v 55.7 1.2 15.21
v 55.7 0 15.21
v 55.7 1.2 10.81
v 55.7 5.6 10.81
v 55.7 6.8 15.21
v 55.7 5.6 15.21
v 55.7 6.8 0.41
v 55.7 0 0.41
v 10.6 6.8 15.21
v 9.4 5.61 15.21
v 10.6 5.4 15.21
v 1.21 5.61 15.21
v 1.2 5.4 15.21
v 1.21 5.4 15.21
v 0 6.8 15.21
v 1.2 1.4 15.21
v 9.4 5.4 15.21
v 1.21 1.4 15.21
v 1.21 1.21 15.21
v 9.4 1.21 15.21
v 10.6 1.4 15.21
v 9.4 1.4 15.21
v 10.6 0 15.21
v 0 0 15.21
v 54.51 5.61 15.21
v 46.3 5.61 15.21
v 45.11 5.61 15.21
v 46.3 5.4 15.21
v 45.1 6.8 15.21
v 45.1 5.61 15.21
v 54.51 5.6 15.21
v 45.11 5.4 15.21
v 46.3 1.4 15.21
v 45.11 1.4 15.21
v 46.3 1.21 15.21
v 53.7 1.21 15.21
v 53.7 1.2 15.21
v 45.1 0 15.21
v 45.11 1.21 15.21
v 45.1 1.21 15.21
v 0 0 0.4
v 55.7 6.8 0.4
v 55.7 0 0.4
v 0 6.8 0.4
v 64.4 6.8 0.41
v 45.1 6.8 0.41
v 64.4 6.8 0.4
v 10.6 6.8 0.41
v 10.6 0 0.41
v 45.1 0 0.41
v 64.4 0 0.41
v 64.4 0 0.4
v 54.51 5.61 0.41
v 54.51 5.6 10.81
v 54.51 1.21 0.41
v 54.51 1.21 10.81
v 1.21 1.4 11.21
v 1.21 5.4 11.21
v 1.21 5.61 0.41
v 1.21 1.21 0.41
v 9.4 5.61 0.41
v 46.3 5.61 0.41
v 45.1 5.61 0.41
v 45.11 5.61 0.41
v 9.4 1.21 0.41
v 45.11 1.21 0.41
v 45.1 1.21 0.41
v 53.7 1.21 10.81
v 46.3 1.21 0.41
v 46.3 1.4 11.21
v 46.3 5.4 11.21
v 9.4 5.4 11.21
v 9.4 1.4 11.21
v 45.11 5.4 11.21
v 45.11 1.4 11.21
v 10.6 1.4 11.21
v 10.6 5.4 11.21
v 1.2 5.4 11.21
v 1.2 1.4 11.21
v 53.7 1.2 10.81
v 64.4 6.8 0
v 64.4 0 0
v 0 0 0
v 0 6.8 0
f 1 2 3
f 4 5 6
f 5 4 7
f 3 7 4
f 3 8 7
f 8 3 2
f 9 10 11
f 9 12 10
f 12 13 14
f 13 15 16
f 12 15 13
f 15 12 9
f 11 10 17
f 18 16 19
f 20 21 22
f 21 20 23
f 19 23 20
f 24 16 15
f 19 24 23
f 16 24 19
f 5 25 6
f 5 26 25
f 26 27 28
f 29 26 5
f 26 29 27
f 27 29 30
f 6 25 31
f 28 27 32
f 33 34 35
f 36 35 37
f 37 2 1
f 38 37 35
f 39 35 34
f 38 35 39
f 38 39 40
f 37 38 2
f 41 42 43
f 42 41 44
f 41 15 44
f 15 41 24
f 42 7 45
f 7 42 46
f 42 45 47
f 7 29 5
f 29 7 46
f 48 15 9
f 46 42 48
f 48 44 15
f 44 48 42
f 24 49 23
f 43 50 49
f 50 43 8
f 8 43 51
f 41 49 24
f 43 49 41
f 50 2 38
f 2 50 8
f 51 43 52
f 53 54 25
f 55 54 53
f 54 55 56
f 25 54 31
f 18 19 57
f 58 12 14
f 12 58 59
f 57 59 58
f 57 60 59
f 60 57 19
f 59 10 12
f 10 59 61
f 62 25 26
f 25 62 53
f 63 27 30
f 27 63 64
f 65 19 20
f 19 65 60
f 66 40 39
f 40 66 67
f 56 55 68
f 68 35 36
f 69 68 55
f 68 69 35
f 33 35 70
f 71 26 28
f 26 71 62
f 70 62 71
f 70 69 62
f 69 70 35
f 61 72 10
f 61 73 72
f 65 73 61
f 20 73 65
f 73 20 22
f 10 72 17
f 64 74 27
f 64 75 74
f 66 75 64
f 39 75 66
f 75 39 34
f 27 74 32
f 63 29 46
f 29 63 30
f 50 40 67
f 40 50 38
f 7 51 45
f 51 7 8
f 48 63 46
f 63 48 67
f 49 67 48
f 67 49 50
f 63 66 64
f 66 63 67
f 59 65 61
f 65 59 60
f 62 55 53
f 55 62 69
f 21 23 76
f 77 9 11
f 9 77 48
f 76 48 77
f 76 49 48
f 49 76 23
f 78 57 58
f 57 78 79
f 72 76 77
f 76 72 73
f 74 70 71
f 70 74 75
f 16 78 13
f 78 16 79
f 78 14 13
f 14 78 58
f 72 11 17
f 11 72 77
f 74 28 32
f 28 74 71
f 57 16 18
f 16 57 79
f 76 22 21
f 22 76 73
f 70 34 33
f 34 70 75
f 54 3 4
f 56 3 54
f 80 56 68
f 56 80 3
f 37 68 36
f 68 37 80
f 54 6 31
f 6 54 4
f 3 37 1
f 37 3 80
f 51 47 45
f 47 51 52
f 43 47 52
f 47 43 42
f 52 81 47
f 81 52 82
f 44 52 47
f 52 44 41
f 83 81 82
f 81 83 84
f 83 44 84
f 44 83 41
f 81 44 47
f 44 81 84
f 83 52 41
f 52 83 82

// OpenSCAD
// file: ../../Base/Rotation.scad
// Fischertechnik Box Foundation
// Geometry Helpers Rotation

include <PlacementOptions.scad>

// getRotatedSpace(space, rotation=NoRotation)
// Rotates the space dependent on the specified rotation

function getRotatedSpace(space, rotation=NoRotation) = [
    (rotation == Rotate90 || rotation == Rotate270) ? space.y : space.x,
    (rotation == Rotate90 || rotation == Rotate270) ? space.x : space.y
];

// Rotates the given space around the fixed left lower corner
// space = the space the children needs as width/depth list [width,depth]
// rotation = 0 Rotate0 degrees, 1 Rotate90 degrees, 2 Rotate180 degrees, 3 Rotate270 degrees (equivalent to -90)

module RotateFix(space, rotation=NoRotation) {
    dy = (rotation == Rotate0 || rotation == Rotate270) ? 0 :
        (rotation == Rotate90) ? space.x :
        space.y;
    dx = (rotation < Rotate180) ? 0 :
        (rotation == Rotate180) ? space.x :
        space.y;
    
    translate([dx, dy, 0])
        rotate([0, 0, rotations[rotation]])
            children();
}
// file: ../../Base/Alignment.scad
// Fischertechnik Box Foundation
// Geometry Helpers Alignment

include <PlacementOptions.scad>

// getAlignedX(elementWidth, spaceWidth, align=AlignRight, offset=0)
// Gets the aligned X offset of an element with the given
// width in the given space.
// elementWidth = The width of the element to positon
// spaceWidth = The space where the element should be aligned
// align = 0 AlignLeft, 1 AlignCenter, 2 AlignRight
// offset = an optional offset from the aligned position. When
// aligned left or centered, then positive values are in X direction.
// When aligned right then positive values are in negative X direction.

function getAlignedX(elementWidth, spaceWidth, align=AlignRight, offset=0) =
    (align == AlignLeft) ?
        offset :
        ((align == AlignCenter) ?
        (spaceWidth - elementWidth)/2 + offset :
        spaceWidth - offset - elementWidth);

// getAlignedY(elementDepth, spaceDepth, align=AlignTop, offset=0)
// Gets the aligned Y offset of an element with the given
// depth in the given space.
// elementDepth = The depth of the element to positon
// spaceDepth = The space where the element should be aligned
// align = 0 AlignBottom, 1 AlignCenter, 2 AlignTop
// offset = an optional offset from the aligned position. When
// aligned bottom or centered, then positive values are in Y direction.
// When aligned top then positive values are in negative Y direction.

function getAlignedY(elementDepth, spaceDepth, align=AlignTop, offset=0) =
    (align == AlignBottom) ?
        offset :
        ((align == AlignCenter) ?
        (spaceDepth - elementDepth)/2 + offset :
        spaceDepth - offset - elementDepth);
// file: ../../Base/PlacementOptions.scad
// Fischertechnik Box Foundation
// Placement Options

// Alignment
NoAlign = 0;
AlignLeft = 1;
AlignBottom = 2;
AlignCenter = 3;
AlignRight = 4;
AlignTop = 5;

// Element rotation degree steps
rotations = [0, -90, -180, -270];

// Rotation
NoRotation = 0;
Rotate0 = 0;
Rotate90 = 1;
Rotate180 = 2;
Rotate270 = 3;

// Docking (seen from above)
NoDock = -1;
DockLeft = 0;
DockTop = 1;
DockRight = 2;
DockCorner = 2;
DockBottom = 3;

// Web corners
LowerLeft = 0;
UpperLeft = 1;
UpperRight = 2;
LowerRight = 3;

// Web position relative to corner
LeftOfCorner = 0;
RightOfCorner = 1;
// file: ../../Base/Boxes.scad
// Fischertechnik Box Foundation
// Pre-designed Boxes

use <Constants.scad>

include <PlacementOptions.scad>

box190Width = 190;
box190Depth = 130;
box130Width = 130;
box130Depth = 95;

// Values are from an original ec3 box
topBottomDifference = 1.5;
outerHeight = 40;
innerHeight = 38.2;
baseThickness = outerHeight - innerHeight;
stackExcess = 5.7;
radius = 3.5;
wallThickness = 1.5;
tolerance = 0.2;
stackOffset = innerHeight - stackExcess;

boxUsageHeight = stackOffset;
boxWallThickness = wallThickness;
boxBaseThickness = baseThickness;
boxWebWidth = 3.0;

// getBoxWallThickness()
// Gets the wall thickness of a Fischertechnik Box
function getBoxWallThickness() = boxWallThickness;

// getBoxUsageHeight()
// Gets the usable height of a Fischertechnik box
function getBoxUsageHeight() = boxUsageHeight;

// getBoxInnerHeight()
// Gets the inner height of a Fischertechnik box, including the stack excess
function getBoxInnerHeight() = innerHeight;

// getBoxBaseThickness()
// Gets the thickness of the Fischertechnik box base.
function getBoxBaseThickness() = boxBaseThickness;

// getBoxWebWidth()
// Gets the width of a box web
function getBoxWebWidth() = boxWebWidth;

// getBox190Space()
// Gets the usable inner space of a Box 190 as an x/y-list
function getBox190Space() = [
    box190Width - 2*getBoxWallThickness() - topBottomDifference, 
    box190Depth - 2*getBoxWallThickness() - topBottomDifference ];

// BoxBase(width, depth)
// Creates an empty stackable Fischertechnik compatible box
// width = Outer width of the box (190, 130, ...)
// depth = Outer depth of the box (130, 95, ...)

module BoxBase(width, depth, height=outerHeight) {    
    thinPlate = 0.01;

    innerHeight = height - baseThickness;    
    
    module BodyPlate(width, depth) {
        translate([radius, radius])
        hull() {
            w = width-2*radius;
            d = depth-2*radius;
            cube([w, d, thinPlate]);
            cylinder(thinPlate, r=radius, $fn=getFragments());
            translate([w, 0])
                cylinder(thinPlate, r=radius, $fn=getFragments());
            translate([w, d])
                cylinder(thinPlate, r=radius, $fn=getFragments());
            translate([0, d])
                cylinder(thinPlate, r=radius, $fn=getFragments());
        }
    }
    
    module Body(tolerance=tolerance) {
        hull() {
            // Bottom with tolerance to fit into the original boxes when stacked
            translate([-wallThickness+tolerance, -wallThickness+tolerance, -baseThickness])
                BodyPlate(width-topBottomDifference-2*tolerance, depth-topBottomDifference-2*tolerance);
            
            // Top
            translate([-wallThickness-topBottomDifference/2, -wallThickness-topBottomDifference/2, innerHeight-thinPlate])
                BodyPlate(width, depth);
         }
    }

    module Cutoff() {
        hull() {
            coWidth = width - 2*wallThickness;
            coDepth = depth - 2*wallThickness;
            
            // Bottom
            BodyPlate(coWidth-topBottomDifference, coDepth-topBottomDifference);

            // Top
            translate([-topBottomDifference/2, -topBottomDifference/2, innerHeight+thinPlate]) 
                BodyPlate(coWidth, coDepth);
        }
    }
    
    difference() {        
        Body();
        Cutoff();
        stackOffset = innerHeight - stackExcess;
        translate([0, 0, stackOffset + baseThickness])
            Body(tolerance=0);
    }
}

// Creates the Fischertechnik empty box 130x190 mm and places it at position 0,0
// 190x130 are the outer sizes, the inner space is slightly smaller. Use getBox190Space() to get the inner sizes.
// The box is positioned that the usable inner space is at the 0,0,0 position. The

module Box190() {
    BoxBase(box190Width, box190Depth);
}

// Gets the usable inner space of a Box 130 as an x/y-list
function getBox130Space() = [
    box130Width - 2*getBoxWallThickness() - topBottomDifference, 
    box130Depth - 2*getBoxWallThickness() - topBottomDifference ];

// Creates the Fischertechnik empty box 95x130 mm and places it at position 0,0
// 190x130 are the outer sizes, the inner space is slightly smaller. Use getBox190Space() to get the inner sizes.
// The box is positioned that the usable inner space is at the 0,0,0 position. The

module Box130() {
    BoxBase(box130Width, box130Depth);
}

// Creates a web at the specified box walls
// corner 0 = LowerLeft, 1 = UpperLeft, 2 = UpperRight, 3 = LowerRight
// side 0 = LeftOfCorner, 1 = RightOfCorner
// distance = Distance in mm from the corner
// boxSpace = inner width and depth of the box (default: Box 190)
// webWidth = length of the web (default is 3 mms)
// webThickness = thickness of the web (default is 1 mm)

module BoxWeb(corner, side, distance, boxSpace=getBox190Space(), webWidth=getBoxWebWidth(), webThickness=1.0) {
    sink = getBoxWallThickness()/2;

    width = (corner % 2 == 0) ? 
            (side == LeftOfCorner ? webWidth : webThickness) :
            (side == LeftOfCorner ? webThickness : webWidth);

    depth = (corner % 2 == 0) ? 
            (side == RightOfCorner ? webWidth : webThickness) :
            (side == RightOfCorner ? webThickness : webWidth);
    
    xDiff = corner == LowerLeft ? 
                (side == LeftOfCorner ? -sink : distance) :
            (corner == UpperLeft ?                
                (side == LeftOfCorner ? distance : -sink) :
            (corner == UpperRight ?
                (side == LeftOfCorner ? boxSpace.x-webWidth+sink : boxSpace.x-distance-webThickness) :
                (side == LeftOfCorner ? boxSpace.x-distance-webThickness: boxSpace.x-webWidth+sink)));

    yDiff = corner == LowerLeft ? 
                (side == RightOfCorner ? -sink : distance) :
            (corner == UpperLeft ?
                (side == RightOfCorner ? boxSpace.y-distance : boxSpace.y-webWidth+sink) :
            (corner == UpperRight ?
                (side == RightOfCorner ? boxSpace.y-webWidth+sink : boxSpace.y-distance) :
                (side == RightOfCorner ? distance : -sink)));
    
    translate([xDiff, yDiff, -getExcess()])
        cube([width, depth, boxUsageHeight + 2*getExcess()]);
}
// file: ../../Base/Placement.scad
// Fischertechnik Box Foundation
// Geometry Helpers Placement

use <Constants.scad>
use <Alignment.scad>
use <Rotation.scad>
use <Boxes.scad>

include <PlacementOptions.scad>

// Place(x=0, y=0, elementSpace=[0,0], alignX=AlignLeft, alignY=AlignBottom, rotation=Rotate0, boxSpace=getBox190Space())
// Places the child at the specified position
// y = Y-Position. This is a relative position when an X aligment is specified.
// x = X-Position. This is a relative position when an Y aligment is specified.
// elementSpace = space of the element to be placed [x,y]
// alignX = -1=NoAlign, 0 AlignLeft, 1 AlignCenter, 3 AlignRight (elementSpace and boxSpace required!)
// alignY = -1=NoAlign, 2 AlignBottom, 1 AlignCenter, 4 AlignTop (elementSpace and boxSpace required!)
// rotation = 0 Rotate0 0 degrees, 1 Rotate90 90 degrees, 
// 2 Rotate180 180 degrees, 3 Rotate270 270 degrees (equivalent to -90)
// boxSpace = Inner space of the box where the placement occurs [x,y] - default is Box 190x130 inner space

module Place(x=0, y=0, elementSpace=[0,0], 
  alignX=AlignLeft, alignY=AlignBottom, 
  rotation=NoRotation, boxSpace=getBox190Space()) {

    module Position(x, y, space, rotation=Rotate0) {
        translate([x, y, 0])
            RotateFix(space, rotation)
                children();
    }

    space = getRotatedSpace(elementSpace, rotation);
    alignedX = getAlignedX(space.x, boxSpace.x, alignX, x);
    alignedY = getAlignedY(space.y, boxSpace.y, alignY, y);
    Position(alignedX, alignedY, elementSpace, rotation)
        children();
}

// Center(space=getBox130Space(), elementSpace=[0,0])
// space = Space where the children is centered. For cylinder use centered=true and no elementSpace.
// elementSpace = space of the element to be centered [x,y]

module Center(space=getBox190Space(), elementSpace=[0,0]) {
    Place(elementSpace=elementSpace, boxSpace=space, alignX=AlignCenter, alignY=AlignCenter)
        children();
}

// CenterHorizontal(width=0, y=0, offset=0, space=getBox130Space())
// width = Width of the element to be placed.
// y = Y position of the element
// offset = Offset from the center position (negative will be left of the center)
// space = Space where the element is placed

module CenterHorizontal(width=0, y=0, offset=0, space=getBox190Space()) {
    Place(x=offset, y=y, elementSpace=[width, 0], boxSpace=space, alignX=AlignCenter)
        children(0);
}

// CenterVertical(depth=0, x=0, offset=0, space=getBox130Space())
// depth = Depth of the element to be placed.
// x = X position of the element
// offset = Offset from the center position (negative will be down of the center)
// space = Space where the element is placed

module CenterVertical(depth=0, x=0, offset=0, space=getBox190Space()) {
    Place(x=x, y=offset, elementSpace=[0, depth], boxSpace=space, alignY=AlignCenter)
        children(0);
}

// getIsVertical(align)
// True if the specified alignment needs a vertical orientation for a divider (AlignRight, AlignLeft)

function getIsVertical(align) = (align == AlignRight || align == AlignLeft);

// getIsHorizontal(align)
// True if the specified alignment needs a horizontal orientation for a divider (AlignTop, AlignBottom)

function getIsHorizontal(align) = (align == AlignTop || align == AlignBottom);
// file: ../../Elements/AxisClip10.scad
// Fischertechnik Box Library
// Axis for clip 10
// 31023

use <../ModelBase/Simple.scad>
use <../Base/Constants.scad>

width = 12;
depth = 12;
height = 23;
upperDiameter = 3.6;
clipHeight = 10;

// getAxisClip10Space()
// Gets the space of a frame for a clip 10 with spring ring (mot2)

function getAxisClip10Space() = [width, depth, height];

// AxisClip10(height, clipHeight)
// Axis for clip 10 with spring ring (mot2)
// height = Height of the complete axis
// clipHeight = Height of the rt for the clip (standard is 10, in mot3 its only 7)

module AxisClip10(height=height, clipHeight=clipHeight) {
    LeveledAxisWithSpace(height, height-clipHeight, getAxisClip10Space(), diameter=upperDiameter);
}

// Tests
color("lightgray")
AxisClip10();
// file: ../../Base/Constants.scad
// Fischertechnik Box Foundation
// Constants

// Constant values necessary for multiple elements

// Base constants
dividerThickness = 1.2;
excess = 0.01;
fragments = 90;
tolerance = 0.8;

// Gets the thickness of a divider 
function getDividerThickness() = dividerThickness;

// Gets the excess that is used to merge walls into each other
function getExcess() = excess;

// Gets amount of fragments of a cylinder
function getFragments() = fragments;

// Gets the inner tolerance of a frame to each side
function getTolerance() = tolerance;


// Fischertechnik specific constants
axisDiameter = 4;
axisBottomDiameter = axisDiameter + 1;
standardEdgeDistance = 2.5;
standardWebDistance = 11.5;
standardCornerLength = 15;
tubeWallFactor = 0.8;
smallPartsFrameHeight = 20;

// Gets axis diameter
function getAxisDiameter() = axisDiameter;

// Gets axis bottom diameter for thicker part at the bottom
function getAxisBottomDiameter() = axisBottomDiameter;

// gets the standard distance to the wall of the box for dockable frames with webs
function getStandardEdgeDistance() = standardEdgeDistance;

// gets the standard distance of each web to the corner of the dockable frame
function getStandardWebDistance() = standardWebDistance;

// gets the standard length of the corner walls of a dockable frame
function getStandardCornerLength() = standardCornerLength;

// gets the wall thickness of a tube.
function getTubeWallThickness() = tubeWallFactor * getDividerThickness();

// gets the frame height for docked small parts boxes.
function getSmallPartsFrameHeight() = smallPartsFrameHeight;
// file: ../../Elements/FrameAxis60Open.scad
// Fischertechnik Box Library
// Frame for single 60 mm Axis in 55mm distance and one open (mot1)
// 31032

use <../Base/Constants.scad>
use <../ModelBase/Simple.scad>
use <../ModelBase/Complex.scad>

length = 52.5;

// getFrameAxis60OpenSpace()
// Gets the width (.x) and depth (.y) of the axis frame.

function getFrameAxis60OpenSpace() = [
    getFrameAxisSpace(length).x + 7.5 + getDividerThickness(),
    getFrameAxisSpace(length).y,
    getFrameAxisSpace(length).z];

// FrameAxis60Open()
// Axis holder for a single 60 mm axis.

module FrameAxis60Open() {
    Space(getFrameAxis60OpenSpace());
    
    difference() {
        FrameAxis(length);
        translate([length+getDividerThickness(), getDividerThickness(), getFrameAxisHeight()-getFrameAxisDepth()])
            cube([getDividerThickness()*2, getFrameAxisDepth(), getFrameAxisDepth() + getExcess()]);
    }
}

// Test
color("lightgray")
FrameAxis60Open();
// file: ../TestPrint.scad
// 3D Print Test Base

use <../Base/Constants.scad>

use <../Elements/AxisClip10.scad>

module TestPrint(elementSpace) {
    cube([elementSpace.x, elementSpace.y, 0.4]);
    translate([0,0,0.4+getExcess()]) {
        children();
    }
}

TestPrint(getAxisClip10Space())
    AxisClip10();
// main file
// 3D Print Test
// FrameAxis60Open

use <../TestPrint.scad>
use <../../Elements/FrameAxis60Open.scad>

TestPrint(getFrameAxis60OpenSpace())
    FrameAxis60Open();
